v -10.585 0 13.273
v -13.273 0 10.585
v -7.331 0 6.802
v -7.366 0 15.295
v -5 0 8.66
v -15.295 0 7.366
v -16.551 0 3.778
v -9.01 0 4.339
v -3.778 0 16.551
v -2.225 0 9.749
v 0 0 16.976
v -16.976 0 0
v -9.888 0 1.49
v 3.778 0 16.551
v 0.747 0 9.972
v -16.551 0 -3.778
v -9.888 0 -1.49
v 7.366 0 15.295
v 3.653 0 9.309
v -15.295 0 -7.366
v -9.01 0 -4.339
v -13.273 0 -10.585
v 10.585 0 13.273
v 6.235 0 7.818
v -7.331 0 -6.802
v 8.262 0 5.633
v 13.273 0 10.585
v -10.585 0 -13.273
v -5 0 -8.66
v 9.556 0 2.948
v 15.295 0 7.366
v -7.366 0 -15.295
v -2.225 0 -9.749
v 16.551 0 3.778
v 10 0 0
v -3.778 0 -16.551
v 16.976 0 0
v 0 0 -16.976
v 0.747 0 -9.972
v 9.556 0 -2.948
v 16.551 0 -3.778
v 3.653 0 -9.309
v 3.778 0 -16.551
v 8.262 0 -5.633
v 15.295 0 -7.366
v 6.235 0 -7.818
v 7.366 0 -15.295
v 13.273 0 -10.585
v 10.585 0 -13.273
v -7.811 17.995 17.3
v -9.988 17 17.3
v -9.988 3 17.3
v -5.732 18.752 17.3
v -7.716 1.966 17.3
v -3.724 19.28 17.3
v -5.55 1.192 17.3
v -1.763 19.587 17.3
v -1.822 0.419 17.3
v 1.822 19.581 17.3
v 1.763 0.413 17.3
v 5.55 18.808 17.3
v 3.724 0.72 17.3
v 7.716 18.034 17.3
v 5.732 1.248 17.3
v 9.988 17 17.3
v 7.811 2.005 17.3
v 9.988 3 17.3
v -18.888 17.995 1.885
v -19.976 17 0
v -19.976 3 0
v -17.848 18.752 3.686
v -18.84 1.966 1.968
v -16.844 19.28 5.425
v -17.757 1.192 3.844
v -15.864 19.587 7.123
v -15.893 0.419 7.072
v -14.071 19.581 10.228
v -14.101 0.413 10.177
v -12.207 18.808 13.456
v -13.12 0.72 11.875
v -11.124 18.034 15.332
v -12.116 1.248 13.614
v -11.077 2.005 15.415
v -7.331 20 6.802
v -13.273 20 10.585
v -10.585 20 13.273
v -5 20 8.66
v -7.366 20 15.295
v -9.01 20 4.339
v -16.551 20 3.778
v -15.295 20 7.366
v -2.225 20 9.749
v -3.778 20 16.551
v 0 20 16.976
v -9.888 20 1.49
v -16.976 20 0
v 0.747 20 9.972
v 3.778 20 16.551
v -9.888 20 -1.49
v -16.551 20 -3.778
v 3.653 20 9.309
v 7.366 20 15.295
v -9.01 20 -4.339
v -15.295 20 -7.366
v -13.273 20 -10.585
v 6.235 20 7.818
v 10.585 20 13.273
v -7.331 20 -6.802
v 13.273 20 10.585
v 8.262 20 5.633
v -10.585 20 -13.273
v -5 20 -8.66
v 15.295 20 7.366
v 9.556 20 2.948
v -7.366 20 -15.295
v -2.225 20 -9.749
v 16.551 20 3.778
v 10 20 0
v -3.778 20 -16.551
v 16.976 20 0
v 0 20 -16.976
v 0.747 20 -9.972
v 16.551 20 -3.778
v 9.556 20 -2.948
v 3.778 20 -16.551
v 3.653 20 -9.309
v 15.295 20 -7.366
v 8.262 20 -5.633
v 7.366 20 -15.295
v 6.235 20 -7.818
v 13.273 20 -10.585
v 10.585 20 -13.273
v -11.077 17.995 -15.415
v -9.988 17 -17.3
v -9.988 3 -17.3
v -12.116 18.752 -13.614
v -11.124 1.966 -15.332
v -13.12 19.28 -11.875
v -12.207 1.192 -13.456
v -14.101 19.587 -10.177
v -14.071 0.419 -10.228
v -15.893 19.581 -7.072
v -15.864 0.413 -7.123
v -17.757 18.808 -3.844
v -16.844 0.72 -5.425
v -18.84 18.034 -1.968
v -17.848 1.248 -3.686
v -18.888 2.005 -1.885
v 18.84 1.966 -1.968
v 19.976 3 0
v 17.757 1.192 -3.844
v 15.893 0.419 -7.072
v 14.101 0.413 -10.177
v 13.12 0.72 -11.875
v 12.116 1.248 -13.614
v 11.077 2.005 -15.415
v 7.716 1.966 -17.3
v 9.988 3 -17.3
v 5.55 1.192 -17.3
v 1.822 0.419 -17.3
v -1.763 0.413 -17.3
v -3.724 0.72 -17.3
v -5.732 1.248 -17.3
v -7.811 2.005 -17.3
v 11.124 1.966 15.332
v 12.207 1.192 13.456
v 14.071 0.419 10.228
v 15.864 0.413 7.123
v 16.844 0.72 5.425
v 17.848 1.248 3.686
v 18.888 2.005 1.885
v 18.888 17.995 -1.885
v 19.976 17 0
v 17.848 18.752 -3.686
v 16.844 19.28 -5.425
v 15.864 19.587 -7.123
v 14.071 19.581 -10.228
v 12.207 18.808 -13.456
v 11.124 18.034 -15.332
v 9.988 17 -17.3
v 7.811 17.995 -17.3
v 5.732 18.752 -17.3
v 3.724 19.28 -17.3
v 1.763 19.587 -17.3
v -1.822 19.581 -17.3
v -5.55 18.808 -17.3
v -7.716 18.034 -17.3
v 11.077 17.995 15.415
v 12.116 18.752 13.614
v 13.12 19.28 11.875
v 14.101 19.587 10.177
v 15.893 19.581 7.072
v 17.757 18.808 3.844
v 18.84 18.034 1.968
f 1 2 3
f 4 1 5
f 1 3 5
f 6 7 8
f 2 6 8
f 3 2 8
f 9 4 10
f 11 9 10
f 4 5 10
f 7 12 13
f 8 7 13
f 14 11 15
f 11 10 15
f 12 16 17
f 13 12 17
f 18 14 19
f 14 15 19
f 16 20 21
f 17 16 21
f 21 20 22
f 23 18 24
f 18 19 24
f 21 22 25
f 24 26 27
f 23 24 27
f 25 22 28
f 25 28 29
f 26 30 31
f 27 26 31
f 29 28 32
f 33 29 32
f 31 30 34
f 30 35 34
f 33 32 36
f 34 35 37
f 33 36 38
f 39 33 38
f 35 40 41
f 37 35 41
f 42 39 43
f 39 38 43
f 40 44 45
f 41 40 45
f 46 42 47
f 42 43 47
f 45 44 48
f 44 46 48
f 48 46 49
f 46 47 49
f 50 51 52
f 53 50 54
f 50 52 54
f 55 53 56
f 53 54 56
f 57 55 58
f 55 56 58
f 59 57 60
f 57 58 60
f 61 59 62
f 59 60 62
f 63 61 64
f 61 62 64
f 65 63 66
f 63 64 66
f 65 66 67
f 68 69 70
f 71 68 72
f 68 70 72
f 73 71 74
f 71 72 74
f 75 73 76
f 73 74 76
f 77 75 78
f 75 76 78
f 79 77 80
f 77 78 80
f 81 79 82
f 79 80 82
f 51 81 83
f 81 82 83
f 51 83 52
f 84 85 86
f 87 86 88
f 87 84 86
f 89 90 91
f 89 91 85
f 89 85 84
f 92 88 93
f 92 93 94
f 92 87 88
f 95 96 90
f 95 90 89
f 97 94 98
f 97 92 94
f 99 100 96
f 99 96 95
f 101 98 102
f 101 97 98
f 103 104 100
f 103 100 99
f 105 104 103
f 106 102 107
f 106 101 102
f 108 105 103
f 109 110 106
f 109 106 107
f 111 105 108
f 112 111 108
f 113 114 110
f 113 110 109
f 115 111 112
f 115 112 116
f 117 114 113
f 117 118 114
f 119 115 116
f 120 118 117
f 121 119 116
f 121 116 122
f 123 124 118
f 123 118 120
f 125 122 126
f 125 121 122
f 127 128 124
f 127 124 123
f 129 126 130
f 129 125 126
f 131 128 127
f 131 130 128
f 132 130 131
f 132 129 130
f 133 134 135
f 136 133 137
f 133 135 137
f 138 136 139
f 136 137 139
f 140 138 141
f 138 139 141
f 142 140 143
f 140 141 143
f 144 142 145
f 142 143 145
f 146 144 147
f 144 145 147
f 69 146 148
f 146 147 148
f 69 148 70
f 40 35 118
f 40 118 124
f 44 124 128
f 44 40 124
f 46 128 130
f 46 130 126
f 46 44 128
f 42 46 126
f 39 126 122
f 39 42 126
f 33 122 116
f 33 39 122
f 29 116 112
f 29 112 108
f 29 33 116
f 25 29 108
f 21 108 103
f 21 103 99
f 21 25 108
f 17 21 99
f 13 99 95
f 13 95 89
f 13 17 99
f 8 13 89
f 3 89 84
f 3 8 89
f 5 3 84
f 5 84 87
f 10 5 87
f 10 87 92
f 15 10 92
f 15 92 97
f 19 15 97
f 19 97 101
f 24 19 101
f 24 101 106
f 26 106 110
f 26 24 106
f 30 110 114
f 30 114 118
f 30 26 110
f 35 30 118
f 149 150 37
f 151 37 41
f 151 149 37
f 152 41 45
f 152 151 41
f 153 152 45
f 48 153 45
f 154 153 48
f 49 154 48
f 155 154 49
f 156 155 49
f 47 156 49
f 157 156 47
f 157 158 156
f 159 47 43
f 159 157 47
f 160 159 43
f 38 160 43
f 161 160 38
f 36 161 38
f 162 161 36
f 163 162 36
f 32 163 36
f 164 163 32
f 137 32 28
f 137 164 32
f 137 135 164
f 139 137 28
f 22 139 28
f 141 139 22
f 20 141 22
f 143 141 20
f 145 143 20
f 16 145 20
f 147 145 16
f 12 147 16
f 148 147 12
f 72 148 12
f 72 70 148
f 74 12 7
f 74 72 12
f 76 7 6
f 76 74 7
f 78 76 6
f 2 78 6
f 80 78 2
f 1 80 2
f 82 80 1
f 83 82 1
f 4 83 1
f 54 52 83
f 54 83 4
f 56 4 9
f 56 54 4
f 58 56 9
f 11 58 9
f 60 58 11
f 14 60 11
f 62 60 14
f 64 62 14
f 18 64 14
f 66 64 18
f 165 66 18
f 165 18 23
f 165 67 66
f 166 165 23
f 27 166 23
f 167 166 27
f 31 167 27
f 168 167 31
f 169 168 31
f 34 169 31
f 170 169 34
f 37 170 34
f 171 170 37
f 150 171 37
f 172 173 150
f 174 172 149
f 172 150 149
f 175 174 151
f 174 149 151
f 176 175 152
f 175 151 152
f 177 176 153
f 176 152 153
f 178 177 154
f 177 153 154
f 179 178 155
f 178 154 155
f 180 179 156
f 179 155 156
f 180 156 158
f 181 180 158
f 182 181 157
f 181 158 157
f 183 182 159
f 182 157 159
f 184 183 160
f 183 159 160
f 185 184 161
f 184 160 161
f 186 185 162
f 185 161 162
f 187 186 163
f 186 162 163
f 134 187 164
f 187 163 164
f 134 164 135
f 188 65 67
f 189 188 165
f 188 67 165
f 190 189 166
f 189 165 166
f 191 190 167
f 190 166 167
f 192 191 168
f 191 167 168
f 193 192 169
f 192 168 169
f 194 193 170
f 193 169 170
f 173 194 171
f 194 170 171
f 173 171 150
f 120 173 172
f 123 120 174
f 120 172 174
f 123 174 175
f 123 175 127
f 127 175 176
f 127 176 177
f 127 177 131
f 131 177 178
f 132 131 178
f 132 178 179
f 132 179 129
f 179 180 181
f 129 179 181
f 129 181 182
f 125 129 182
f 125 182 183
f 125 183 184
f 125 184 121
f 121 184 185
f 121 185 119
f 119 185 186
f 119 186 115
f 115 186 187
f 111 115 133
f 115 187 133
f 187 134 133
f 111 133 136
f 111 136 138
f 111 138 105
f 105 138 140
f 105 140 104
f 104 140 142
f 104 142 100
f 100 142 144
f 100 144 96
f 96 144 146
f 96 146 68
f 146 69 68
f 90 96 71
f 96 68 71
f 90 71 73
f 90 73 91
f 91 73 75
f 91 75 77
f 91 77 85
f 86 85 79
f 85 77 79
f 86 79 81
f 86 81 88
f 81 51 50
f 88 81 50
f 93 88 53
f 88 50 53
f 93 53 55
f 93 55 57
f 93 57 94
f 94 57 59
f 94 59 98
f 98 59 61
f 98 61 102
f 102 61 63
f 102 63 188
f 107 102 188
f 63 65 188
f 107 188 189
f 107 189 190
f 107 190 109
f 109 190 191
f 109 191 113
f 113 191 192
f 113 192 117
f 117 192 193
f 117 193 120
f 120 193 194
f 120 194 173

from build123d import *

# Parameters (mm, degrees)
SKETCH5_R           = 10
BOSS_EXTRUDE1_DEPTH = 20


with BuildPart() as part:
    # Sketch5 → Boss-Extrude1 (new body)
    with BuildSketch(Plane(origin=(0, 0, 0), x_dir=(1, 0, 0), z_dir=(0, 1, 0))):
        Polygon((19.976319314, 0), (9.988159657, 17.3), (-9.988159657, 17.3), (-19.976319314, 0), (-9.988159657, -17.3), (9.988159657, -17.3), align=None)
        Circle(SKETCH5_R, mode=Mode.SUBTRACT)
    extrude(amount=BOSS_EXTRUDE1_DEPTH)

    # Sketch6 → Cut-Revolve1 (revolve, cut)
    with BuildSketch(Plane.XY):
        Polygon((19.976319314, 0), (16.976319314, 0), (19.976319314, 3), align=None)
        Polygon((19.976319314, 20), (16.976319314, 20), (19.976319314, 17), align=None)
    revolve(axis=Axis((0, 0, 0), (0, 1, 0)), mode=Mode.SUBTRACT)


solid = part.part
